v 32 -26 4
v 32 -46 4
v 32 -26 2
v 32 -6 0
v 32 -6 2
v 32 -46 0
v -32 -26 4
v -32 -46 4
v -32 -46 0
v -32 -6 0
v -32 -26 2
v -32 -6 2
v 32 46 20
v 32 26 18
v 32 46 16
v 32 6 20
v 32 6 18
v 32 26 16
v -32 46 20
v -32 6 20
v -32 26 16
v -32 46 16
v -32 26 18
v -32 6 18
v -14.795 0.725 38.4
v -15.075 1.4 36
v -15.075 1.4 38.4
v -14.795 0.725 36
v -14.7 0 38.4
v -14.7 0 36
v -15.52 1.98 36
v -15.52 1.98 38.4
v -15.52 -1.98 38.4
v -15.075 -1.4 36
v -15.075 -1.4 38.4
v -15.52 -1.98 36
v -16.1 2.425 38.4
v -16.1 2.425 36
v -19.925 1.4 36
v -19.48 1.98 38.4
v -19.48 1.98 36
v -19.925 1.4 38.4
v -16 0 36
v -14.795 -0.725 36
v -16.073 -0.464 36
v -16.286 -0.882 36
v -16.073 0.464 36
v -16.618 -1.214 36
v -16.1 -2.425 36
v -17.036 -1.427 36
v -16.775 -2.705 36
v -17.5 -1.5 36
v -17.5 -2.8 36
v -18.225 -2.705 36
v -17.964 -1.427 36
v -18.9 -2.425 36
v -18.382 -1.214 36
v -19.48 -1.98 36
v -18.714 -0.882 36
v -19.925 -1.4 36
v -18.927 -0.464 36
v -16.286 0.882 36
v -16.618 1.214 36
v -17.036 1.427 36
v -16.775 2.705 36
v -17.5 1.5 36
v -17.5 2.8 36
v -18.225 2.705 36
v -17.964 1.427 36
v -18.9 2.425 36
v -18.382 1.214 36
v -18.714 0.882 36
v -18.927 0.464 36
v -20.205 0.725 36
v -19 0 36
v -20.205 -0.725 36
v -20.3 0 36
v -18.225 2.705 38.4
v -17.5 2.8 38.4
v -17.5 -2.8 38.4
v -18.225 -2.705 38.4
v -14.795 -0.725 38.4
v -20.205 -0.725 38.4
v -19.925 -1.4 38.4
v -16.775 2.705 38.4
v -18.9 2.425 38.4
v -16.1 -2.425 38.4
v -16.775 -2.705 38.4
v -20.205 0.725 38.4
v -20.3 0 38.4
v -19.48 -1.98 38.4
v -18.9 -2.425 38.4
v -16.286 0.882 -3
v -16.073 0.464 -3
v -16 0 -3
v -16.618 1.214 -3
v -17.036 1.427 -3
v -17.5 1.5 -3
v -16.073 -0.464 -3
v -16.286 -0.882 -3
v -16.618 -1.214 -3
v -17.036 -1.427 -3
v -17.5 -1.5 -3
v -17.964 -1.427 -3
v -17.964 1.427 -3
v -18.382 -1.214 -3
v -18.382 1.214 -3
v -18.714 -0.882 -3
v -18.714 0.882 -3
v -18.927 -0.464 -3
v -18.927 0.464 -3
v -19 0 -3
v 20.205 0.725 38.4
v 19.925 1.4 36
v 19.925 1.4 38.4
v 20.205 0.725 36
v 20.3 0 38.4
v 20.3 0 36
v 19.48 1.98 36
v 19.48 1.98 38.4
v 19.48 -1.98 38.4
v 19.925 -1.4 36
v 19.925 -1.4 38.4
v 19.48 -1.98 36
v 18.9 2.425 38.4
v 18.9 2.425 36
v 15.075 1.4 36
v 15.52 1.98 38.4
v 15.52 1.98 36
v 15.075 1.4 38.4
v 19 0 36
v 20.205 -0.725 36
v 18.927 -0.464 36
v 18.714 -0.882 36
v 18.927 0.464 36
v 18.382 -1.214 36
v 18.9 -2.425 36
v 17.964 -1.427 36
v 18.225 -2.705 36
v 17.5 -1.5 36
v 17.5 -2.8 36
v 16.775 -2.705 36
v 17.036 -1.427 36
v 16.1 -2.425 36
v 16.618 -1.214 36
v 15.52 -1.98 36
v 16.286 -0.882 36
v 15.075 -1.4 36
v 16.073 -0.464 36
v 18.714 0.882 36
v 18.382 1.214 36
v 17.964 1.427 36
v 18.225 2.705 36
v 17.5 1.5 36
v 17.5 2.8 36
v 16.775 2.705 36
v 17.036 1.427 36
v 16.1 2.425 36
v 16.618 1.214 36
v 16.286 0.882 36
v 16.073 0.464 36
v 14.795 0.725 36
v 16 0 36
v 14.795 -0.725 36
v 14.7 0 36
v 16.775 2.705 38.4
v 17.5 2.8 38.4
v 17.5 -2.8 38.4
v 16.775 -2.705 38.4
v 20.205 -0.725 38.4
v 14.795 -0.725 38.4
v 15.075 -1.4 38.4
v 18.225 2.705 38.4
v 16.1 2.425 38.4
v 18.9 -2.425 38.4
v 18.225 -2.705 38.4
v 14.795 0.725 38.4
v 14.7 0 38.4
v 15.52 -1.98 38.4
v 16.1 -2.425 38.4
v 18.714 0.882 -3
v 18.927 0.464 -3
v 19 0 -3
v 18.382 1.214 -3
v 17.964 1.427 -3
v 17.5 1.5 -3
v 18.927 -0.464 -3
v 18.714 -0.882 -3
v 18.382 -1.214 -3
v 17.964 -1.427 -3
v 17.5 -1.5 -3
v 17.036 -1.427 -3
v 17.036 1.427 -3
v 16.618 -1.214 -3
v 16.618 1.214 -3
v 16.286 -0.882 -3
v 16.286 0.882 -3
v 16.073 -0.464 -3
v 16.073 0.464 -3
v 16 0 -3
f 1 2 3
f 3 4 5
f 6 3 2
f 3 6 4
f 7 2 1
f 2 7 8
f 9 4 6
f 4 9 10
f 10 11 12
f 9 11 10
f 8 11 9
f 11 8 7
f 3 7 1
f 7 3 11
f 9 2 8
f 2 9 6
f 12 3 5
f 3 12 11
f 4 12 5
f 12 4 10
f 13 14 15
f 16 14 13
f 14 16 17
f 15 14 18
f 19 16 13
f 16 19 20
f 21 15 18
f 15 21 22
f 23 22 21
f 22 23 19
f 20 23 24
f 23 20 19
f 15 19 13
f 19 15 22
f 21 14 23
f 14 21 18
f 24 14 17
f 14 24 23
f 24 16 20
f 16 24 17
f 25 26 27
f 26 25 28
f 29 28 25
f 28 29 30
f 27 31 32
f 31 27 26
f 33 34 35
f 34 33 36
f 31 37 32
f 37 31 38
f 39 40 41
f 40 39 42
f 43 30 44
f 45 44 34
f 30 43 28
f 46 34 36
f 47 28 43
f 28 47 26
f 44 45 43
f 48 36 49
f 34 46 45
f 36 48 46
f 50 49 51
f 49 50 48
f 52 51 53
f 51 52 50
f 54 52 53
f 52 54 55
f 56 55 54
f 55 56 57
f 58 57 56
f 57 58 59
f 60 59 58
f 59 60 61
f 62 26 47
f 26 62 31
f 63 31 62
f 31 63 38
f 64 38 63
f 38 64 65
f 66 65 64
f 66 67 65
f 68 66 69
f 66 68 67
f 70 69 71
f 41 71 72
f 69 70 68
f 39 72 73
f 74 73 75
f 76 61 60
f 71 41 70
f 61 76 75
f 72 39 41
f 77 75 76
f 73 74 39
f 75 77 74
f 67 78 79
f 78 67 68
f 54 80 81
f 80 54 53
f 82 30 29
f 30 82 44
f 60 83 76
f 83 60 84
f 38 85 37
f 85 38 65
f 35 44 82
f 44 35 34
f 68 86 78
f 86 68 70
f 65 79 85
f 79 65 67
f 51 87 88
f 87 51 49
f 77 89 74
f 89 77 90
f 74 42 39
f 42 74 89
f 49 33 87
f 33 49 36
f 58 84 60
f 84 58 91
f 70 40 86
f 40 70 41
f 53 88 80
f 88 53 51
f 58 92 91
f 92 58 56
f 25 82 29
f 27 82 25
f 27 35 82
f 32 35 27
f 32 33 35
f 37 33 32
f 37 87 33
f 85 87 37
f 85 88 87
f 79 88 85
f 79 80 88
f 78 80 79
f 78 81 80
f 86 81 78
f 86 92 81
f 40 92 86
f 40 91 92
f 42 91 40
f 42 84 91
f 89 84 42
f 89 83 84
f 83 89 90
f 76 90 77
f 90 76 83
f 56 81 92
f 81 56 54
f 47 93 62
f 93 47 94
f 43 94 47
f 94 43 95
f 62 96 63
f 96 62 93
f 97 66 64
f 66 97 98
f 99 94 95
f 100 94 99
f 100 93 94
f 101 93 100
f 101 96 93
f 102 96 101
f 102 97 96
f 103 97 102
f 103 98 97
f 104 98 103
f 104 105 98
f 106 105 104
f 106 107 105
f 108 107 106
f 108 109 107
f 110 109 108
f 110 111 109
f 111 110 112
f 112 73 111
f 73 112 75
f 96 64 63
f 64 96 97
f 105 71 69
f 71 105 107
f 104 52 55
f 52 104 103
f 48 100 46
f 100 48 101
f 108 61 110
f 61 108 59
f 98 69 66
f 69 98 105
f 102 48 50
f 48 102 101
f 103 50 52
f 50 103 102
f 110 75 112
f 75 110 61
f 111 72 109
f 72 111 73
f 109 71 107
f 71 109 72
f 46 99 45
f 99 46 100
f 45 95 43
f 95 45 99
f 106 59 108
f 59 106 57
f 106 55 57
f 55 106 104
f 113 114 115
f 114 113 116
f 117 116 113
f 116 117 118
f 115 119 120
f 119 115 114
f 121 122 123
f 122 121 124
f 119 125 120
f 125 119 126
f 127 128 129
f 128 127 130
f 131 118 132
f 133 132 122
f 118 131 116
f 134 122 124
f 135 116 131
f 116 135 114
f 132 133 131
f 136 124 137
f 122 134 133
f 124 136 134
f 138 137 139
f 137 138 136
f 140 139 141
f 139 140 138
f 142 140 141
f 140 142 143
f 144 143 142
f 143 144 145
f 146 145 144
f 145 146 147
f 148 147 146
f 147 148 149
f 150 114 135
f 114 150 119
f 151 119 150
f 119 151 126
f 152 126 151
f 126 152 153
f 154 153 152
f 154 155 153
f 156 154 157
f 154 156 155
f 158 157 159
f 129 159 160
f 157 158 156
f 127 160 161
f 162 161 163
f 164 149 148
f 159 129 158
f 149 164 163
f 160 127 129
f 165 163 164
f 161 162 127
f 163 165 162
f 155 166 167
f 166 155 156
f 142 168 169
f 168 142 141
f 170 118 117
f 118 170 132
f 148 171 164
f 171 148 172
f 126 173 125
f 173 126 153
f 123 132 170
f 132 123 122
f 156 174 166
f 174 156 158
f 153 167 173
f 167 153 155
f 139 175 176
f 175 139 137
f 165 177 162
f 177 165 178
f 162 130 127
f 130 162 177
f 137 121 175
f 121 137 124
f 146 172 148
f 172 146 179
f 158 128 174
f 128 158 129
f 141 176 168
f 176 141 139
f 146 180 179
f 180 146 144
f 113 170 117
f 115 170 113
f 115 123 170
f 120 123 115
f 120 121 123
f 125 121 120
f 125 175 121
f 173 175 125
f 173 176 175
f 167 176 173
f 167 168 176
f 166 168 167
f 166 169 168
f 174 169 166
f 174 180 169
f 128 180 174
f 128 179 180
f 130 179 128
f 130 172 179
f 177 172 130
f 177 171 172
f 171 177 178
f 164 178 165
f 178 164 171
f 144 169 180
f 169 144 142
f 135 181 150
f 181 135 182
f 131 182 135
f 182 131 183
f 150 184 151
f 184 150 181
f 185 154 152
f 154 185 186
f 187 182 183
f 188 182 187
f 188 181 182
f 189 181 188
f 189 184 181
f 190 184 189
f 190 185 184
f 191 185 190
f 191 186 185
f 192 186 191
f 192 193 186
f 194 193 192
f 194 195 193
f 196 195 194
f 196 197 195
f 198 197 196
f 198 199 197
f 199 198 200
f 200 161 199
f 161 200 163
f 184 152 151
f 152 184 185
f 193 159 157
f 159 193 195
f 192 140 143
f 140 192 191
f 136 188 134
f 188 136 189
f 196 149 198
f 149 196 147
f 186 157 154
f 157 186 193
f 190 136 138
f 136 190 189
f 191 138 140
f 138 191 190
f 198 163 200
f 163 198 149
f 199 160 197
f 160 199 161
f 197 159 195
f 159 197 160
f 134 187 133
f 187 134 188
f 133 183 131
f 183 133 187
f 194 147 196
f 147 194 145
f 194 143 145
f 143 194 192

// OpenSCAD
// file: ../print/common.scad
// ============================================================================
// common.scad - shared parameters and helpers for EEELunarRover printed parts
// ----------------------------------------------------------------------------
// Units: millimetres. Every dimension below is taken either from the EEEBug
// V3.1 laser-cut CAD (mech/chassis.svg, measured) or from a verified component
// datasheet (see mech/rover_layout.md section "Verified part dimensions").
//
// Printer envelope: 200 x 200 x 200 mm PLA. We deliberately keep every part
// under 180 mm in its longest axis (lab guidance: do not use the full bed).
// ============================================================================

$fn = 60;
eps = 0.05;

// ---------- Fasteners (verified: M3 nylon hex A/F measured 5.4-5.6 mm) -------
M3_CLEAR  = 3.4;   // clearance for an M3 screw / standoff thread
M3_TAP    = 2.9;   // pilot for self-tapping an M3 into PLA
M3_HEAD   = 6.2;   // M3 pan-head clearance diameter
M3_HEXAF  = 5.8;   // nylon M3 hex standoff/nut across-flats + fit clearance
WALL      = 2.0;   // default wall (5 perimeters @ 0.4 mm nozzle)

// ---------- Chassis: EEEBug V3.1 (from mech/chassis.svg) ---------------------
CH_W   = 95.0;     // chassis width  (X)
CH_L   = 205.0;    // chassis length (Y)
CH_T   = 3.0;      // 3 mm acrylic
AXLE_Y = 105.0;    // drive-wheel centreline (waist pinches 95->85 mm, y 96-114)

// Central M3 anchor rectangle straddling the axle (chassis coords, Ø3.1 holes):
//   (10.5, 95) (84.5, 95) (10.5, 129) (84.5, 129)  ->  74 mm (X) x 34 mm (Y)
ANCHOR_PITCH_X = 74.0;
ANCHOR_PITCH_Y = 34.0;

// Standard modular interface: every small sensor mount bolts on with
// 2x M3 at this pitch.
DOCK_PITCH = 12.0;

// ---------- Verified component dimensions ------------------------------------
// OSRAM SFH 300 phototransistor: 5 mm T-1 3/4 radial, body Ø5.1, ~8.6 tall,
//   leads 2.54 mm pitch.
SFH300_DIA = 5.1;
// Murata MA40S4R 40 kHz ultrasonic Rx: body Ø9.9, 7.1 tall, leads 5.0 mm pitch.
US_DIA   = 9.9;
US_H     = 7.1;
US_PITCH = 5.0;
// Honeywell SS49E linear Hall: flat package 4.1 (W) x 1.7 (thk) x 3.0 (H),
//   3 leads at 1.27 mm pitch.
HALL_W = 4.1;
HALL_T = 1.7;
HALL_H = 3.0;
// Roth perfboards (FR4, 1.5 mm): RE015 = 40.5 x 40.0 ; RE016 = 68.58 x 67.94.
PB_SMALL = [40.5, 40.0, 1.5];
PB_LARGE = [68.58, 67.94, 1.5];

// ---------- helpers ----------------------------------------------------------
module m3_clear(h = 30) { translate([0,0,-eps]) cylinder(d = M3_CLEAR, h = h + 2*eps); }
module m3_tap(h = 30)   { translate([0,0,-eps]) cylinder(d = M3_TAP,   h = h + 2*eps); }
module hexAF(af, h)     { cylinder(r = af/sqrt(3), h = h, $fn = 6); }

// 2x M3 clearance holes at DOCK_PITCH, centred on the origin along X.
module dock_holes(h = 30) {
    for (s = [-1, 1]) translate([s*DOCK_PITCH/2, 0, 0]) m3_clear(h);
}
// main file
// seam_joint.scad - how the two deck halves join (OVERLAP / half-lap) diagram
//   -D mode="exploded"  -> pulled apart so you see the two ledges
//   -D mode="assembled" -> overlapped, with the 2 screws through
include <../print/common.scad>

DT = 4;
mode = "exploded";
EX  = (mode == "exploded") ? 16 : 0;
SLAB_X = 64; BODY = 20; LAP = 20;
HX = 17.5;

module halfA() {   // front: full body + thin BOTTOM ledge into the overlap
    union() {
        translate([-SLAB_X/2, -(BODY+LAP/2), 0]) cube([SLAB_X, BODY, DT]);
        translate([-SLAB_X/2, -LAP/2, 0])        cube([SLAB_X, LAP, DT/2]);
    }
}
module halfB() {   // rear: full body + thin TOP ledge into the overlap
    union() {
        translate([-SLAB_X/2, LAP/2, 0])         cube([SLAB_X, BODY, DT]);
        translate([-SLAB_X/2, -LAP/2, DT/2])     cube([SLAB_X, LAP, DT/2]);
    }
}
module screw(len) { color("FireBrick") { cylinder(d=5.6,h=2.4,$fn=24); translate([0,0,-len]) cylinder(d=3,h=len,$fn=20); } }

color("Silver")    translate([0, -EX, 0])    halfA();   // slides forward when exploded
color("Gainsboro") translate([0,  EX, EX])   halfB();   // slides back + lifts when exploded
for (sx = [-1,1]) translate([sx*HX, 0, DT + 2*EX]) screw(DT + 2*EX + 3);  // 2 screws clamp the overlap
